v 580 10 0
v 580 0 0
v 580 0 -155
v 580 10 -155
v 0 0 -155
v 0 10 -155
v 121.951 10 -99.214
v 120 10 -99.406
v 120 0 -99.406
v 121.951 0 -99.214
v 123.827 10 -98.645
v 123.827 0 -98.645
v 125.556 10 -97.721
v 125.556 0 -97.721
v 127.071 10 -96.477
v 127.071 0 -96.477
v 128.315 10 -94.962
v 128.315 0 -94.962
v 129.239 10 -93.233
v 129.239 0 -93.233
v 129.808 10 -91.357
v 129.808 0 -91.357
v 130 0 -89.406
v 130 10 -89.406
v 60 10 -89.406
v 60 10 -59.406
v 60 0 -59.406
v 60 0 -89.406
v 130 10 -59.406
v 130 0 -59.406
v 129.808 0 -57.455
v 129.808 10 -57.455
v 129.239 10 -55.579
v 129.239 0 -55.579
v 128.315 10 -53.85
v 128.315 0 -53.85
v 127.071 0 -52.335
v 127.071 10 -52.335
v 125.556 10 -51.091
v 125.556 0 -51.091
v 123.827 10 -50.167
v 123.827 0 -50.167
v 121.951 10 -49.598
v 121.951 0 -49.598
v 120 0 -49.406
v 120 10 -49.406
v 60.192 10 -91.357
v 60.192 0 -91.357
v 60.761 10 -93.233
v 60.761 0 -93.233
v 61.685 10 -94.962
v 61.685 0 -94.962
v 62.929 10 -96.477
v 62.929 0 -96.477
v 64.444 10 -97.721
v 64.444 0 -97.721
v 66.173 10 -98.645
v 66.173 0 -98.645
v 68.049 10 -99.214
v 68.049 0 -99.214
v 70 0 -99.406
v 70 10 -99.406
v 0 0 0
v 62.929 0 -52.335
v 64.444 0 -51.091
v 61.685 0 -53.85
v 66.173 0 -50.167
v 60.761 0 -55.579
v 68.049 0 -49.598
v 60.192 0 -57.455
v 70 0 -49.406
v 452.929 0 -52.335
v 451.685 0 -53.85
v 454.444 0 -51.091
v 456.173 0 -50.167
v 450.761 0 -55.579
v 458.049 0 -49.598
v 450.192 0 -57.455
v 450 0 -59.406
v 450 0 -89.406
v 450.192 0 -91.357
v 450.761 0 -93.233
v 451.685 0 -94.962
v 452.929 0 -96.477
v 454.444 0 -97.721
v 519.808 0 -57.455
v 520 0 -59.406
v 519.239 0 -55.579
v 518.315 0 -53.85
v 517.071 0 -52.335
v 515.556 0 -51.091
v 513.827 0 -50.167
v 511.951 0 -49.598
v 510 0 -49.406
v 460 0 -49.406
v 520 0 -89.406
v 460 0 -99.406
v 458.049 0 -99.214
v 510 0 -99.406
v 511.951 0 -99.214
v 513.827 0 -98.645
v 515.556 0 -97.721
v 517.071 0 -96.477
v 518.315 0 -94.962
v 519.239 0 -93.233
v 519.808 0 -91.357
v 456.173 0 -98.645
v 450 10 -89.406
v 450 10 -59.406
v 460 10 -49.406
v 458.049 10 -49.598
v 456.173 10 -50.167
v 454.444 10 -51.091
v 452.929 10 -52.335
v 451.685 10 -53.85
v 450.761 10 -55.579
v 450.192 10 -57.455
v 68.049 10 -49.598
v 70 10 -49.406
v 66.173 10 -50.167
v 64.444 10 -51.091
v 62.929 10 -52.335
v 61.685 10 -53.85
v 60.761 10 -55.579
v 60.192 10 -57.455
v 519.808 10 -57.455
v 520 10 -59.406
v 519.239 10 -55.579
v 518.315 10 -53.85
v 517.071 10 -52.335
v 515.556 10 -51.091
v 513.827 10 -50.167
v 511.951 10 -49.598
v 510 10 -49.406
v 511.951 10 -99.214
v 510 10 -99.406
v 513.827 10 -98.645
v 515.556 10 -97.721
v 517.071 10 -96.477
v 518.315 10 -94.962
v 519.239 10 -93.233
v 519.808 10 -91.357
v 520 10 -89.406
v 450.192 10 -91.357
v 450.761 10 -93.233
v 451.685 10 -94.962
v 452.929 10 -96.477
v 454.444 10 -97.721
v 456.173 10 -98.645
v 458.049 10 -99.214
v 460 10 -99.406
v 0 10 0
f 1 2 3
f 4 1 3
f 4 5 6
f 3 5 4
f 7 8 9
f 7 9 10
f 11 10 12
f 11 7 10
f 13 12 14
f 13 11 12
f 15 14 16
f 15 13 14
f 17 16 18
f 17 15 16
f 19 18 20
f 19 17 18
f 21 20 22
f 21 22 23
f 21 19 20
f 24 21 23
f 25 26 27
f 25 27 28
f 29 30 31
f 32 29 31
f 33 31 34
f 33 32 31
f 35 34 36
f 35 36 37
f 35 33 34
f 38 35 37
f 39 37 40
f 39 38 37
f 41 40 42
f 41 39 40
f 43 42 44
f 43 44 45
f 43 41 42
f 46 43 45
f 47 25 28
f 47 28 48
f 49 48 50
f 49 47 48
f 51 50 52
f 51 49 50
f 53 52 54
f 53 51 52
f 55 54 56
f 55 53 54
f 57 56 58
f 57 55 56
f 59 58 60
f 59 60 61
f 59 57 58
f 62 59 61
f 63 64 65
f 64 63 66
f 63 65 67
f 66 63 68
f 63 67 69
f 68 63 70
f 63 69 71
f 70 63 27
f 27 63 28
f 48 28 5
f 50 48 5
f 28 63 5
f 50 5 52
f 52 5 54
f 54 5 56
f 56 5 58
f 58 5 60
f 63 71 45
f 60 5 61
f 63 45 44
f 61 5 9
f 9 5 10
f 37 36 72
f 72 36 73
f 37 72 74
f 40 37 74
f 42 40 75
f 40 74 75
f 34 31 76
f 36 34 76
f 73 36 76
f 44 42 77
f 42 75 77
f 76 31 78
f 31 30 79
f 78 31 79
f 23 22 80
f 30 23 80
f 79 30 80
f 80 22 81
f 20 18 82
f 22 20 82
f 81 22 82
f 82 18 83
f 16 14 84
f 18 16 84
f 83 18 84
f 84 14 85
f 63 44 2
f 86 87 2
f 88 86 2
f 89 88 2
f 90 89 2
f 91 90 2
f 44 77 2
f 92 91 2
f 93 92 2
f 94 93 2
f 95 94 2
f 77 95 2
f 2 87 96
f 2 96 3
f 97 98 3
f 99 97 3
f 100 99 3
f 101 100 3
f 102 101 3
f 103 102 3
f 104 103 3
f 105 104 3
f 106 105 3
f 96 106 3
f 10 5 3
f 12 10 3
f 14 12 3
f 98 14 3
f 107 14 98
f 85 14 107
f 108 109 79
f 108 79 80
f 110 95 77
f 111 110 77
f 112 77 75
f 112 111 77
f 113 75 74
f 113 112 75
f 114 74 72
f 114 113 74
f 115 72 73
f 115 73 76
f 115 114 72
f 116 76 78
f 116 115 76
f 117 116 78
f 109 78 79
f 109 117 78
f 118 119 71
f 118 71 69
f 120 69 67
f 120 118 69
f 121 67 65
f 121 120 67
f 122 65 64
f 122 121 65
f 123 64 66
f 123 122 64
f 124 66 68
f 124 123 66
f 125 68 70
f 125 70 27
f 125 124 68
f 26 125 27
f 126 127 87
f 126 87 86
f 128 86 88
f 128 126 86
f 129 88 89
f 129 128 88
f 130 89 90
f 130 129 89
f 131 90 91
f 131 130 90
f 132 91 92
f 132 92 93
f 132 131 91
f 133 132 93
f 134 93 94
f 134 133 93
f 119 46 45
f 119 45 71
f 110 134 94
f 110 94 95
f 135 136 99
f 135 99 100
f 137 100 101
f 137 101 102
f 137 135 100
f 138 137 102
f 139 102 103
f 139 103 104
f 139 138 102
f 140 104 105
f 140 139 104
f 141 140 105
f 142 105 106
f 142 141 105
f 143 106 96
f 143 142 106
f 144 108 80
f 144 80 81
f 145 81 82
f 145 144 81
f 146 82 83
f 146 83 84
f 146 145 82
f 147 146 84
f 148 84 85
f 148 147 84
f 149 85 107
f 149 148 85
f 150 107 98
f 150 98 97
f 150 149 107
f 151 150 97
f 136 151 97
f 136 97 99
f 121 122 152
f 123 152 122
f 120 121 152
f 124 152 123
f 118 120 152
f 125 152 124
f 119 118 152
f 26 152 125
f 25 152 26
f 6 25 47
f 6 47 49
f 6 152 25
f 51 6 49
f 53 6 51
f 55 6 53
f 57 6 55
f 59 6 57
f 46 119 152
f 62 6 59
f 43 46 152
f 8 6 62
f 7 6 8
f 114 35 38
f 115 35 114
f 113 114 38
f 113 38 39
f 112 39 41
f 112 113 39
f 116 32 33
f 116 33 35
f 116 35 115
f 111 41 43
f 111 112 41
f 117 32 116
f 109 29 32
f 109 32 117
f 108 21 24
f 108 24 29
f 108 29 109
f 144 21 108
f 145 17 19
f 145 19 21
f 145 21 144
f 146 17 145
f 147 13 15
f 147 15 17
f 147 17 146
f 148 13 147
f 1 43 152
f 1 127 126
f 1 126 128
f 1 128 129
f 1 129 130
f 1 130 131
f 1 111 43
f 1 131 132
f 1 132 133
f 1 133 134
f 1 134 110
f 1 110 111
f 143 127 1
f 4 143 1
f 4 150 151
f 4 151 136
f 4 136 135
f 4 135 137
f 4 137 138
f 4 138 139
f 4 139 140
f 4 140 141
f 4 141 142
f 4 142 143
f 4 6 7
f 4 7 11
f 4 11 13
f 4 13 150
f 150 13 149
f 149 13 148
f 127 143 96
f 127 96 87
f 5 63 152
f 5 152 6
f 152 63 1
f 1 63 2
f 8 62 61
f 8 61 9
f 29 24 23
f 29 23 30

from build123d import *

# Parameters (mm, degrees)
ESQUISSE1_W             = 580
ESQUISSE1_H             = 155
BOSS_EXTRU_1_DEPTH      = 10
ENL_V_MAT_EXTRU_1_DEPTH = 10


with BuildPart() as part:
    # Esquisse1 → Boss.-Extru.1 (new body)
    with BuildSketch(Plane(origin=(0, 0, 0), x_dir=(1, 0, 0), z_dir=(0, 1, 0))):
        with Locations((290, 77.5)):
            Rectangle(ESQUISSE1_W, ESQUISSE1_H)
    extrude(amount=BOSS_EXTRU_1_DEPTH)

    # Esquisse2 → Enlèv. mat.-Extru.1 (cut)
    with BuildSketch(Plane(origin=(0, 10, 0), x_dir=(1, 0, 0), z_dir=(0, 1, 0))):
        with BuildLine():
            Line((70, 99.405892869), (120, 99.405892869))
            ThreePointArc((120, 99.405892869), (127.071067812, 96.476960681), (130, 89.405892869))
            Line((130, 89.405892869), (130, 59.405892869))
            ThreePointArc((130, 59.405892869), (127.071067812, 52.334825057), (120, 49.405892869))
            Line((120, 49.405892869), (70, 49.405892869))
            ThreePointArc((70, 49.405892869), (62.928932188, 52.334825057), (60, 59.405892869))
            Line((60, 59.405892869), (60, 89.405892869))
            ThreePointArc((60, 89.405892869), (62.928932188, 96.476960681), (70, 99.405892869))
        make_face()
        with BuildLine():
            Line((460, 99.405892869), (510, 99.405892869))
            ThreePointArc((510, 99.405892869), (517.071067812, 96.476960681), (520, 89.405892869))
            Line((520, 89.405892869), (520, 59.405892869))
            ThreePointArc((520, 59.405892869), (517.071067812, 52.334825057), (510, 49.405892869))
            Line((510, 49.405892869), (460, 49.405892869))
            ThreePointArc((460, 49.405892869), (452.928932188, 52.334825057), (450, 59.405892869))
            Line((450, 59.405892869), (450, 89.405892869))
            ThreePointArc((450, 89.405892869), (452.928932188, 96.476960681), (460, 99.405892869))
        make_face()
    extrude(amount=-ENL_V_MAT_EXTRU_1_DEPTH, mode=Mode.SUBTRACT)


solid = part.part
